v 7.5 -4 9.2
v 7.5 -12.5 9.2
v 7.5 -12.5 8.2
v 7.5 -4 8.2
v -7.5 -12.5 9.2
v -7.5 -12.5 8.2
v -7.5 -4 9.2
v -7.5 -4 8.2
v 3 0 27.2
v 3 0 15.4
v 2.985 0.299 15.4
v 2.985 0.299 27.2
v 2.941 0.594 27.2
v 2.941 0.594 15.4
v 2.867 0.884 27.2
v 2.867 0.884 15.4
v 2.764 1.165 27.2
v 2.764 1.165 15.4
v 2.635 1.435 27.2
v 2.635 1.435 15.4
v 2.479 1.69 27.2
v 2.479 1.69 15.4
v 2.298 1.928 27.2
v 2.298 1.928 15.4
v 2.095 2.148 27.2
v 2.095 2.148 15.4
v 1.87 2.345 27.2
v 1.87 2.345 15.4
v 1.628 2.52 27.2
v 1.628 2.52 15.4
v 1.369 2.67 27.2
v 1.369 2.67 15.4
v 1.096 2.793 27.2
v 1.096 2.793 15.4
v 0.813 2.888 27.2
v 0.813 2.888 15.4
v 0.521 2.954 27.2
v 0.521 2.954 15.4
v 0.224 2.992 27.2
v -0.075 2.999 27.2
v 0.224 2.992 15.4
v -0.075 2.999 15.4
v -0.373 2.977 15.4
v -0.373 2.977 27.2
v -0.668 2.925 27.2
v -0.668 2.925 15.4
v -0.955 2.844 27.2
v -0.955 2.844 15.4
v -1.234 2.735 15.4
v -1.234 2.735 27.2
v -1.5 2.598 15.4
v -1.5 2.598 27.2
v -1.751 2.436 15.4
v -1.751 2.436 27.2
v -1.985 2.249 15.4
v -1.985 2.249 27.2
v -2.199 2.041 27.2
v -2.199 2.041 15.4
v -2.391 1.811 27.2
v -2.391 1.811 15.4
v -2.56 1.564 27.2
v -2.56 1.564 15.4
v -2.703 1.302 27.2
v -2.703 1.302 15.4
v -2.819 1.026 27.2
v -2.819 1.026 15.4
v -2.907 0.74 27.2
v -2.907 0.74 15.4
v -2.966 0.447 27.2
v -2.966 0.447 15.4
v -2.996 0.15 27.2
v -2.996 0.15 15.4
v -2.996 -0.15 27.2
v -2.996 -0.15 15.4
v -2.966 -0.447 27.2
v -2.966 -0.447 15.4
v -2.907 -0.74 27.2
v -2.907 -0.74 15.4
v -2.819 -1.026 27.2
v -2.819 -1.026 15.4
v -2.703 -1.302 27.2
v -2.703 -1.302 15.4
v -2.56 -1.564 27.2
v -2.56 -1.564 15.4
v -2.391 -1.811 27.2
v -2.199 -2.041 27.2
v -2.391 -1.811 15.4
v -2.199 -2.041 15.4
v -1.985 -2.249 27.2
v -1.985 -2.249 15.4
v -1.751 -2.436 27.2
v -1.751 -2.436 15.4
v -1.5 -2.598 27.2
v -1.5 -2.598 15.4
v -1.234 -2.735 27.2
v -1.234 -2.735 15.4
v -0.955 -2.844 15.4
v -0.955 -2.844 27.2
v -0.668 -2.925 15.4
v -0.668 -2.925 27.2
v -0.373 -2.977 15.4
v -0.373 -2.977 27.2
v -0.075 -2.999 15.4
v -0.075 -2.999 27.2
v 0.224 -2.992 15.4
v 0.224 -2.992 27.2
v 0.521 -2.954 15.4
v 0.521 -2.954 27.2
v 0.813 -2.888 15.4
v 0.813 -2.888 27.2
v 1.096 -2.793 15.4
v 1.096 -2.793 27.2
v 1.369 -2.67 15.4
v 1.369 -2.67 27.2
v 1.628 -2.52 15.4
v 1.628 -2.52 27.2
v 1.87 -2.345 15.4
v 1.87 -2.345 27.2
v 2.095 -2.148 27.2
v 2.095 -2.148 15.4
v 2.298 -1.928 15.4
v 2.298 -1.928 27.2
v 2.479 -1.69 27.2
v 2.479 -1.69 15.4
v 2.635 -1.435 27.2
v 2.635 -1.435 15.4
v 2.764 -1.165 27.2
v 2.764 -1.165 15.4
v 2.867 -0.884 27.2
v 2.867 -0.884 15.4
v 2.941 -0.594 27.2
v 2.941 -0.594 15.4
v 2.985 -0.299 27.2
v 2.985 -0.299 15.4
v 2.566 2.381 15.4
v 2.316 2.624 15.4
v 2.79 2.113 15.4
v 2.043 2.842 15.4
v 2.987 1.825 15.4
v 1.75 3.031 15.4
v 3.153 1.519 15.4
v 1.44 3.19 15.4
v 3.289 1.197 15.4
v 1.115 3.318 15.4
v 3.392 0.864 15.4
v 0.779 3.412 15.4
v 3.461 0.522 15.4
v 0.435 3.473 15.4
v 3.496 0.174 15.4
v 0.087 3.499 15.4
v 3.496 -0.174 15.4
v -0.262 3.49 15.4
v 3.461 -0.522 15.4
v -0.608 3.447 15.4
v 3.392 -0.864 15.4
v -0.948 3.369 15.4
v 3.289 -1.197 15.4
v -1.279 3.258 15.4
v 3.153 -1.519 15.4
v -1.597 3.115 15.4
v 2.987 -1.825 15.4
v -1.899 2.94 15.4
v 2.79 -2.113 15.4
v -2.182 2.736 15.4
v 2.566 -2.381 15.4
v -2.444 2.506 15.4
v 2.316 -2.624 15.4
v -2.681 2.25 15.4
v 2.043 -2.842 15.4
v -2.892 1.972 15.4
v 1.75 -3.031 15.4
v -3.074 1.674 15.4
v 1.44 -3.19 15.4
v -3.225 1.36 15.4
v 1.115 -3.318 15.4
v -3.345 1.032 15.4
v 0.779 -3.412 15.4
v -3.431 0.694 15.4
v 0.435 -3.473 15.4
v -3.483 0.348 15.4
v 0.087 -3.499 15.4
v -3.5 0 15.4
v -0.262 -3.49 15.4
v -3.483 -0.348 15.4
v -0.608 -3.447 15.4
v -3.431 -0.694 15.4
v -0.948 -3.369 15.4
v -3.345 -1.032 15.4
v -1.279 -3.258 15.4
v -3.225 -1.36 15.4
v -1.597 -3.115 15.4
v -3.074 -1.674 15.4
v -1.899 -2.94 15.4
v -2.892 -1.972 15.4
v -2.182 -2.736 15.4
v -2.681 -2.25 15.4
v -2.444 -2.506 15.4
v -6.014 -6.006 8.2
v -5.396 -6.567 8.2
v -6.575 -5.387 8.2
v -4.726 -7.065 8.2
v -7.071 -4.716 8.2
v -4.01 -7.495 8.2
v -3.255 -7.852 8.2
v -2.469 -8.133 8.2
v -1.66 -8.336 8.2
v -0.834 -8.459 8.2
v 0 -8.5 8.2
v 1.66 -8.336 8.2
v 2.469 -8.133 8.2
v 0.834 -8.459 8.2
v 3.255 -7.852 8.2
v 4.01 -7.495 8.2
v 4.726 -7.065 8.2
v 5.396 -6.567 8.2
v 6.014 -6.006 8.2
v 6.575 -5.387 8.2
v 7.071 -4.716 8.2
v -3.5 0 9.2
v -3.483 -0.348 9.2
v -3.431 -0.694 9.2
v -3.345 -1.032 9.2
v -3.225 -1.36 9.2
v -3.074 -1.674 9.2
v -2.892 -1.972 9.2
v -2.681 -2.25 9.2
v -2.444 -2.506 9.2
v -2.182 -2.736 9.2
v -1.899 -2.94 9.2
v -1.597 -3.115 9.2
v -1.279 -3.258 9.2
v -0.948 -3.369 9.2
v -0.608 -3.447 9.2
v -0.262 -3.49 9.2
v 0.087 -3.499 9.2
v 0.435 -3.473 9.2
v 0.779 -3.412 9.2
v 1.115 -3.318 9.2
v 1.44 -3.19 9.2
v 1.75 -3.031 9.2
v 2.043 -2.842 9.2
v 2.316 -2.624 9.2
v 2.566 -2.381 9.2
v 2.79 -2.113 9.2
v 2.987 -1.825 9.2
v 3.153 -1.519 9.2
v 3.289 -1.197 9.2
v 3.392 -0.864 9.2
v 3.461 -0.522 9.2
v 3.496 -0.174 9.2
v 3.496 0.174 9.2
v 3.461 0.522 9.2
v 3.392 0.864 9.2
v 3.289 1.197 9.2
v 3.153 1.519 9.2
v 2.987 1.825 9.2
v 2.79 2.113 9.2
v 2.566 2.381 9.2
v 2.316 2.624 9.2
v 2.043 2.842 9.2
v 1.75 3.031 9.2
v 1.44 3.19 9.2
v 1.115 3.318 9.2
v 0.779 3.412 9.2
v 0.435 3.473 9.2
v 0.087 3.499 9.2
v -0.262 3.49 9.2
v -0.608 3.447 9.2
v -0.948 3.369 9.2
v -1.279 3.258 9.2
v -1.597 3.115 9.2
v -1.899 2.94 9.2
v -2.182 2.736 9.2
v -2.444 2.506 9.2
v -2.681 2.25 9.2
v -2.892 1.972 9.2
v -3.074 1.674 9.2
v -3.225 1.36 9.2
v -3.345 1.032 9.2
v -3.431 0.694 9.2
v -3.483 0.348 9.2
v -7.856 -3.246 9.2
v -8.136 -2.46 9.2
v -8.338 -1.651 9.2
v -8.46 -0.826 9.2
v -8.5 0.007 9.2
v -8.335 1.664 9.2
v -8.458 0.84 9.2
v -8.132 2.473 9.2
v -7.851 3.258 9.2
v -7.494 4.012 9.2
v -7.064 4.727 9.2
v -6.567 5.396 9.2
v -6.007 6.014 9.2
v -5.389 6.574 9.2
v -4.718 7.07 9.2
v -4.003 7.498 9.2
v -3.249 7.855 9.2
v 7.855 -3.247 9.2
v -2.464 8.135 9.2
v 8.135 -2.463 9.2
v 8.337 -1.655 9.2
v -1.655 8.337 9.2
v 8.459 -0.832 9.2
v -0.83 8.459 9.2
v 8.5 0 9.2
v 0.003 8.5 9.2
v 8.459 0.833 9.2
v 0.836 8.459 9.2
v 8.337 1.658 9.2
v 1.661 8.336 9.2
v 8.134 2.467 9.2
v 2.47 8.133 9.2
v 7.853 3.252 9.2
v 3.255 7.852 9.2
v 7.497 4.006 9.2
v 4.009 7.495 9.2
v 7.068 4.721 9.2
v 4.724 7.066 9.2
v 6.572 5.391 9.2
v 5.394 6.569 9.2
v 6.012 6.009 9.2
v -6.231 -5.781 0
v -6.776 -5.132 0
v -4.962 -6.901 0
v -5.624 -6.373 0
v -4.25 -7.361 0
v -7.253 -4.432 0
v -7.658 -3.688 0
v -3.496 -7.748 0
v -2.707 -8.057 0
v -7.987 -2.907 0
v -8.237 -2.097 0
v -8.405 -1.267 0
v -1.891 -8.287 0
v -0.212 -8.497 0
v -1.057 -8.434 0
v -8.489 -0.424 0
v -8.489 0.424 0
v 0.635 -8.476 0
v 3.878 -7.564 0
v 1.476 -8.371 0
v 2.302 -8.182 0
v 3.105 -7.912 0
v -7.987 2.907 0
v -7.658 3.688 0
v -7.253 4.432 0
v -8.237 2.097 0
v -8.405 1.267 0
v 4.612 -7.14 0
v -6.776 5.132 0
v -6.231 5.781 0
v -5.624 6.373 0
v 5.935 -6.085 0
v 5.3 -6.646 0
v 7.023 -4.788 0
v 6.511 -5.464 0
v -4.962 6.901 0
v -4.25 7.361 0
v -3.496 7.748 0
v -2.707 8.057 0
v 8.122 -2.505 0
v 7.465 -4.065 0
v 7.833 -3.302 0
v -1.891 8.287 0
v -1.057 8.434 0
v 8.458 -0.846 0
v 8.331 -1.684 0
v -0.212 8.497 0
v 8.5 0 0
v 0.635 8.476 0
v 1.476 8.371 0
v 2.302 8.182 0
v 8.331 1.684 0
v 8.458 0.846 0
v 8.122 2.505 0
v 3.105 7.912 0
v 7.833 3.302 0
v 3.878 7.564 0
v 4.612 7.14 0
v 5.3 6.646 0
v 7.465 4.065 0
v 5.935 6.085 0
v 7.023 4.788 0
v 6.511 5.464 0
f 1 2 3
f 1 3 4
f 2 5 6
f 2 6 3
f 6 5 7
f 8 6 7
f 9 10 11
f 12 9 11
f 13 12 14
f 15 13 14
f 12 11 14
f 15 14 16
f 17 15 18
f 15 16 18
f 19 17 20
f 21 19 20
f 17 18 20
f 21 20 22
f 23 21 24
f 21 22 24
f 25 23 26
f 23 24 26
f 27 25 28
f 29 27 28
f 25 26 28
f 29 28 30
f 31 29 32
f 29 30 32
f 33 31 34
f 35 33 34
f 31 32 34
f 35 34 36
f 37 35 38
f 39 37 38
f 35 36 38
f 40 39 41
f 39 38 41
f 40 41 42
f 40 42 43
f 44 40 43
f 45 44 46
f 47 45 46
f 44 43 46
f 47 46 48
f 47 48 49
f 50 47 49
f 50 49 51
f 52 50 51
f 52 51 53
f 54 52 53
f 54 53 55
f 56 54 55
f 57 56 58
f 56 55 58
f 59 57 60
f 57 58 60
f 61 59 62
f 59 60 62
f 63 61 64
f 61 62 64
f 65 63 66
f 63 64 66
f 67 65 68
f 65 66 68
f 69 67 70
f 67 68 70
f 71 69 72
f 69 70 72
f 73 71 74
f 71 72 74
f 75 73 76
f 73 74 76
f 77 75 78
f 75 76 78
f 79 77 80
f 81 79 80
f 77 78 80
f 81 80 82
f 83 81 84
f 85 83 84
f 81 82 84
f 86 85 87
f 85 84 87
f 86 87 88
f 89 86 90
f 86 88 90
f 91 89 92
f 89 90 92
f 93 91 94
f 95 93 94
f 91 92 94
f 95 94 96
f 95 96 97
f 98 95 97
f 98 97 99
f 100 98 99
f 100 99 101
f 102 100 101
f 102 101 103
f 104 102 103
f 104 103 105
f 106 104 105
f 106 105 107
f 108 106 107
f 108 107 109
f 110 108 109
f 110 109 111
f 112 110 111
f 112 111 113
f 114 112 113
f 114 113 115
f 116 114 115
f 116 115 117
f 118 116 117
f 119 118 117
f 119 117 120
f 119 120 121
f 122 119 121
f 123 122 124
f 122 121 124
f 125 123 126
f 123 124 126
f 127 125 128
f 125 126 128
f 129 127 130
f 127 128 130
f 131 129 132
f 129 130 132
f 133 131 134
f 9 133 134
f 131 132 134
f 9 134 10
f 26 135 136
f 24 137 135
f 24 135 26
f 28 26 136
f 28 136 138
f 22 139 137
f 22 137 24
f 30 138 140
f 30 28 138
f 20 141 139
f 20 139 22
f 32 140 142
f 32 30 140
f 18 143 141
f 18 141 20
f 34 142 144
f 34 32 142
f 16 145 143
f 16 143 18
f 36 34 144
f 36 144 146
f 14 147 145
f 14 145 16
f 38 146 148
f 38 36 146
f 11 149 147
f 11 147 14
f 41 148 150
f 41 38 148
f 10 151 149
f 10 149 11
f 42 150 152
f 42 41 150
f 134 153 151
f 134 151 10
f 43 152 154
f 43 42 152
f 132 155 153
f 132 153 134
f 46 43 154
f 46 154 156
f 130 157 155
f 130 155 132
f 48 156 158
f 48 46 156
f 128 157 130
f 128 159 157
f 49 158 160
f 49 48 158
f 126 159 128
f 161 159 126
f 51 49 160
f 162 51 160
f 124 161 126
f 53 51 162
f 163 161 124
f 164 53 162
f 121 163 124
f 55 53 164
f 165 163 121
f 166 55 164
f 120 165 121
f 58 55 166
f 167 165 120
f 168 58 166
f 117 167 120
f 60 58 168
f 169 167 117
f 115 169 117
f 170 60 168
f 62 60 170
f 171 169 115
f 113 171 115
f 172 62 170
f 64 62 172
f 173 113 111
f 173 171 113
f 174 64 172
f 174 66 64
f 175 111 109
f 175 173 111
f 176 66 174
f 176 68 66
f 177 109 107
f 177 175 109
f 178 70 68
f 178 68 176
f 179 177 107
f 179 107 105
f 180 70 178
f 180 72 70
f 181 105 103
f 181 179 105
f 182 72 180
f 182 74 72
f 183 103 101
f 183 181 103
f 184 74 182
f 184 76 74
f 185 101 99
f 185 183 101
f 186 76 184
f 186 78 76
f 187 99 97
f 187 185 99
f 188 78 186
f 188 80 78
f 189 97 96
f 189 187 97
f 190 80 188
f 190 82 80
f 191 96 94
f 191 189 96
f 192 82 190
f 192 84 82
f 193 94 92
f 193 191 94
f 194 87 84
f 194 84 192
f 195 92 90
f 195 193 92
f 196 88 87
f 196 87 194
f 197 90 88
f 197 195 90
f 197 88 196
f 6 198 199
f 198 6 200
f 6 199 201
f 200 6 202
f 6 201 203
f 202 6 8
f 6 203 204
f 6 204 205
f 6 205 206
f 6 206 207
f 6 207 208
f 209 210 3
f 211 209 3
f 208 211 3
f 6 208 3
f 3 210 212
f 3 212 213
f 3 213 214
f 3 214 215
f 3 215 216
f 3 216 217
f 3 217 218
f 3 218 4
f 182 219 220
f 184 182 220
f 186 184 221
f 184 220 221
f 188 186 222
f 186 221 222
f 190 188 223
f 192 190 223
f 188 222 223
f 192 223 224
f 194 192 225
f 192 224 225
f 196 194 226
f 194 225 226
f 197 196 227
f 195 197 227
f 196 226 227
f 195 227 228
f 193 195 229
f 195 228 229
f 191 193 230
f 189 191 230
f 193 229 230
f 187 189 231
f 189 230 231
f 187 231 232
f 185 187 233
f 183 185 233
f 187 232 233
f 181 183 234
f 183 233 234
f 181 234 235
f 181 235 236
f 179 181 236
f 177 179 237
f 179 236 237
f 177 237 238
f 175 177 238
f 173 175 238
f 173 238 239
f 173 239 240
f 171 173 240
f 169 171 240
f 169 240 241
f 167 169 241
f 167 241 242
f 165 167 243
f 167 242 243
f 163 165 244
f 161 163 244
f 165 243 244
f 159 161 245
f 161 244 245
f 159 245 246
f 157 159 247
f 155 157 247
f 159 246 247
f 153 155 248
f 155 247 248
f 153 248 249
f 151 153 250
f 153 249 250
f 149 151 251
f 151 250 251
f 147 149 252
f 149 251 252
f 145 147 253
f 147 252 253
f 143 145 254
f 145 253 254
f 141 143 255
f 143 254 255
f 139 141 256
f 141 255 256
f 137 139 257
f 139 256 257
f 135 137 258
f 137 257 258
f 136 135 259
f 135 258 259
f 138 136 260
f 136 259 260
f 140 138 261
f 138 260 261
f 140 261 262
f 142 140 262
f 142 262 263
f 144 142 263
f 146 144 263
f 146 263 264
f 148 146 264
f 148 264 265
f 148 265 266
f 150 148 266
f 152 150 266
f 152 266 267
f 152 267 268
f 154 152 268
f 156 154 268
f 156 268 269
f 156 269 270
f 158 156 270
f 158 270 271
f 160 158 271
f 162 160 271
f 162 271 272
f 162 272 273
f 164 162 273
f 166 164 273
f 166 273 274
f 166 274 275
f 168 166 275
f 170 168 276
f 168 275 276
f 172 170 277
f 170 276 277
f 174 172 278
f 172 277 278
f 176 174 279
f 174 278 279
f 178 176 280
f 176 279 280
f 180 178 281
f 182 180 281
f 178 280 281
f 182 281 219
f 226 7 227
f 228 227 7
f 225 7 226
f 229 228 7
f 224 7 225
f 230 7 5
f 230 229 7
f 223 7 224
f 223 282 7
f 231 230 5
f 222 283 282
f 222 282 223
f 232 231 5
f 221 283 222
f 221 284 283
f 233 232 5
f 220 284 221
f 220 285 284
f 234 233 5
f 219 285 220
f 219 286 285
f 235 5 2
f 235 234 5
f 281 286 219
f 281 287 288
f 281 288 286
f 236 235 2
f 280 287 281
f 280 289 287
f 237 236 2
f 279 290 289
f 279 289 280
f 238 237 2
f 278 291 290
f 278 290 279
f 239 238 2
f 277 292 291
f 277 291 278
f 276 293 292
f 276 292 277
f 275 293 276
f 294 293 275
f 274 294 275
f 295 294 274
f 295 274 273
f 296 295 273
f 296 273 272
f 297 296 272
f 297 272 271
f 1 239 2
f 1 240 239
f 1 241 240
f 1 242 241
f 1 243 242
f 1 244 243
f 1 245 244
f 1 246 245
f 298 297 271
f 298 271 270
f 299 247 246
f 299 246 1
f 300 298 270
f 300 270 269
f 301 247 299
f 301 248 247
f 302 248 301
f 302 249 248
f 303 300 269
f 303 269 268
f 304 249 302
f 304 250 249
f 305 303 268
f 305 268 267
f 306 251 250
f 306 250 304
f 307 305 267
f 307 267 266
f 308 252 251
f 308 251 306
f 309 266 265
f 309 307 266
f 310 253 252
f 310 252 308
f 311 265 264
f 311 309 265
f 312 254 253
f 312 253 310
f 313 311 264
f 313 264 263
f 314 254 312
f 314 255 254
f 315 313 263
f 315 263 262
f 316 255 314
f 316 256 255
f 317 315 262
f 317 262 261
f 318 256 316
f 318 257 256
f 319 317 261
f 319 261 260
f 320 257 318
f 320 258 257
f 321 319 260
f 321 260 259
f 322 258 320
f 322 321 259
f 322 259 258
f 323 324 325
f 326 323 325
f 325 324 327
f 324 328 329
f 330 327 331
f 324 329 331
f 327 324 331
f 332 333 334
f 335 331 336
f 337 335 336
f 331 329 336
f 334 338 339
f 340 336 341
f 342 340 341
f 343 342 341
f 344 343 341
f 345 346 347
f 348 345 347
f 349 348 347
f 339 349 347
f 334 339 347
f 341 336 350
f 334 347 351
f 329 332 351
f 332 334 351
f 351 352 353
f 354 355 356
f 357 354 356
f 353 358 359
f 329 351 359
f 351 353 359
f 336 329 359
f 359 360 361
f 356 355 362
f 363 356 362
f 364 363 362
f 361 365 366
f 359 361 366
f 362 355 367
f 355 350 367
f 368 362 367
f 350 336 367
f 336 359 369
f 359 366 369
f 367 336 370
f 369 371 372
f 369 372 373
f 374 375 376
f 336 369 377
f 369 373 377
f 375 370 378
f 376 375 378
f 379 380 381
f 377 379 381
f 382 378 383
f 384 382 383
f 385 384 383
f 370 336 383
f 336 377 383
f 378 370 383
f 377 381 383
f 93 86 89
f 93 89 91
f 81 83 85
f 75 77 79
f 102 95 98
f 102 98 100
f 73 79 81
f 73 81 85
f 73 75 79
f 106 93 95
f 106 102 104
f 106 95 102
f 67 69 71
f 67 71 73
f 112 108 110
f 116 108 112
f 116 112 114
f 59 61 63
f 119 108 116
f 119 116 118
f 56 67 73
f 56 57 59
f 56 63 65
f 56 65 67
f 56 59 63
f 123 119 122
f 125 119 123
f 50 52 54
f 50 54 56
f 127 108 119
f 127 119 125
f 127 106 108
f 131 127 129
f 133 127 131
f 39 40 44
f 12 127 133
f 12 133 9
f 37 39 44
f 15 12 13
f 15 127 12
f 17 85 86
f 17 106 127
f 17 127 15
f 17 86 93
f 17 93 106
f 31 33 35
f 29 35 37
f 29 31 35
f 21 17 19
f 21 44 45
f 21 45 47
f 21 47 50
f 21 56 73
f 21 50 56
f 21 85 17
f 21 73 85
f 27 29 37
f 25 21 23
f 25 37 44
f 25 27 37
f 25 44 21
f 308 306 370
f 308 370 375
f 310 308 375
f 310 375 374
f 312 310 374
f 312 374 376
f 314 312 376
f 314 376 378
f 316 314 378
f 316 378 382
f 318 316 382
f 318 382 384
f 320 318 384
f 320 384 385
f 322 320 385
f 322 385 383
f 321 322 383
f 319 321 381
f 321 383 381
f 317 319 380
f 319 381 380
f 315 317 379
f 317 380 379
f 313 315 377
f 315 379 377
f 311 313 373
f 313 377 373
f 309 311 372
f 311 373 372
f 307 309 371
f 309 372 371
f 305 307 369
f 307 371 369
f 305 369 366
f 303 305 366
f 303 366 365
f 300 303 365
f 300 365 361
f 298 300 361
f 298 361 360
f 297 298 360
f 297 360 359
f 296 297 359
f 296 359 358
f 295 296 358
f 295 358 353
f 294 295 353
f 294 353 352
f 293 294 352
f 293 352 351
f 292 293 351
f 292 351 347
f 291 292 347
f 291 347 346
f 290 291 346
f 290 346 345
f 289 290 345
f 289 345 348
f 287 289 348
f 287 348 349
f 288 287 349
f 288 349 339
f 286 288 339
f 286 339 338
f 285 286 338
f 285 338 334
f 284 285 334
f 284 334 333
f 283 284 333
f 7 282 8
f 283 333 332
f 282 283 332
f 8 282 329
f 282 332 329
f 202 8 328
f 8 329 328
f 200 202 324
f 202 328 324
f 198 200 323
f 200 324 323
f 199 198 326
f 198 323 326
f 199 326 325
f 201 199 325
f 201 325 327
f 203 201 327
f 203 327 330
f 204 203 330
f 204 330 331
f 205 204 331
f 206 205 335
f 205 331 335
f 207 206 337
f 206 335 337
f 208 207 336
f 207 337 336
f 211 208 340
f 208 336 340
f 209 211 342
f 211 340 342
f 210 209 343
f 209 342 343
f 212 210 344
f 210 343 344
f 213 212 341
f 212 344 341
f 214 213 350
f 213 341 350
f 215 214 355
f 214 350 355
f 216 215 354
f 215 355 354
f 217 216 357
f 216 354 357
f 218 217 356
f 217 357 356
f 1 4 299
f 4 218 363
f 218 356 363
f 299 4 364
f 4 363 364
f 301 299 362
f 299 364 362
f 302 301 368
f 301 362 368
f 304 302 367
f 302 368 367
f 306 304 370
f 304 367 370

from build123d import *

# Parameters (mm, degrees)
SCHIZZO1_R                   = 8.5
ESTRUSIONE_ESTRUSIONE1_DEPTH = 9.2
SCHIZZO2_W                   = 15
SCHIZZO2_H                   = 8.5
ESTRUSIONE_ESTRUSIONE2_DEPTH = 1
SCHIZZO3_R                   = 3.5
ESTRUSIONE_ESTRUSIONE3_DEPTH = 6.2
SCHIZZO4_R                   = 3
ESTRUSIONE_ESTRUSIONE4_DEPTH = 11.8


with BuildPart() as part:
    # Schizzo1 → Estrusione-Estrusione1 (new body)
    with BuildSketch(Plane.XY):
        Circle(SCHIZZO1_R)
    extrude(amount=ESTRUSIONE_ESTRUSIONE1_DEPTH)

    # Schizzo2 → Estrusione-Estrusione2 (add)
    with BuildSketch(Plane.XY.offset(9.2)):
        with Locations((0, -8.25)):
            Rectangle(SCHIZZO2_W, SCHIZZO2_H)
    extrude(amount=-ESTRUSIONE_ESTRUSIONE2_DEPTH)

    # Schizzo3 → Estrusione-Estrusione3 (add)
    with BuildSketch(Plane.XY.offset(9.2)):
        with Locations(Location((0, 0, 0), (0, 0, 180))):
            Circle(SCHIZZO3_R)
    extrude(amount=ESTRUSIONE_ESTRUSIONE3_DEPTH)

    # Schizzo4 → Estrusione-Estrusione4 (add)
    with BuildSketch(Plane.XY.offset(15.4)):
        Circle(SCHIZZO4_R)
    extrude(amount=ESTRUSIONE_ESTRUSIONE4_DEPTH)


solid = part.part
